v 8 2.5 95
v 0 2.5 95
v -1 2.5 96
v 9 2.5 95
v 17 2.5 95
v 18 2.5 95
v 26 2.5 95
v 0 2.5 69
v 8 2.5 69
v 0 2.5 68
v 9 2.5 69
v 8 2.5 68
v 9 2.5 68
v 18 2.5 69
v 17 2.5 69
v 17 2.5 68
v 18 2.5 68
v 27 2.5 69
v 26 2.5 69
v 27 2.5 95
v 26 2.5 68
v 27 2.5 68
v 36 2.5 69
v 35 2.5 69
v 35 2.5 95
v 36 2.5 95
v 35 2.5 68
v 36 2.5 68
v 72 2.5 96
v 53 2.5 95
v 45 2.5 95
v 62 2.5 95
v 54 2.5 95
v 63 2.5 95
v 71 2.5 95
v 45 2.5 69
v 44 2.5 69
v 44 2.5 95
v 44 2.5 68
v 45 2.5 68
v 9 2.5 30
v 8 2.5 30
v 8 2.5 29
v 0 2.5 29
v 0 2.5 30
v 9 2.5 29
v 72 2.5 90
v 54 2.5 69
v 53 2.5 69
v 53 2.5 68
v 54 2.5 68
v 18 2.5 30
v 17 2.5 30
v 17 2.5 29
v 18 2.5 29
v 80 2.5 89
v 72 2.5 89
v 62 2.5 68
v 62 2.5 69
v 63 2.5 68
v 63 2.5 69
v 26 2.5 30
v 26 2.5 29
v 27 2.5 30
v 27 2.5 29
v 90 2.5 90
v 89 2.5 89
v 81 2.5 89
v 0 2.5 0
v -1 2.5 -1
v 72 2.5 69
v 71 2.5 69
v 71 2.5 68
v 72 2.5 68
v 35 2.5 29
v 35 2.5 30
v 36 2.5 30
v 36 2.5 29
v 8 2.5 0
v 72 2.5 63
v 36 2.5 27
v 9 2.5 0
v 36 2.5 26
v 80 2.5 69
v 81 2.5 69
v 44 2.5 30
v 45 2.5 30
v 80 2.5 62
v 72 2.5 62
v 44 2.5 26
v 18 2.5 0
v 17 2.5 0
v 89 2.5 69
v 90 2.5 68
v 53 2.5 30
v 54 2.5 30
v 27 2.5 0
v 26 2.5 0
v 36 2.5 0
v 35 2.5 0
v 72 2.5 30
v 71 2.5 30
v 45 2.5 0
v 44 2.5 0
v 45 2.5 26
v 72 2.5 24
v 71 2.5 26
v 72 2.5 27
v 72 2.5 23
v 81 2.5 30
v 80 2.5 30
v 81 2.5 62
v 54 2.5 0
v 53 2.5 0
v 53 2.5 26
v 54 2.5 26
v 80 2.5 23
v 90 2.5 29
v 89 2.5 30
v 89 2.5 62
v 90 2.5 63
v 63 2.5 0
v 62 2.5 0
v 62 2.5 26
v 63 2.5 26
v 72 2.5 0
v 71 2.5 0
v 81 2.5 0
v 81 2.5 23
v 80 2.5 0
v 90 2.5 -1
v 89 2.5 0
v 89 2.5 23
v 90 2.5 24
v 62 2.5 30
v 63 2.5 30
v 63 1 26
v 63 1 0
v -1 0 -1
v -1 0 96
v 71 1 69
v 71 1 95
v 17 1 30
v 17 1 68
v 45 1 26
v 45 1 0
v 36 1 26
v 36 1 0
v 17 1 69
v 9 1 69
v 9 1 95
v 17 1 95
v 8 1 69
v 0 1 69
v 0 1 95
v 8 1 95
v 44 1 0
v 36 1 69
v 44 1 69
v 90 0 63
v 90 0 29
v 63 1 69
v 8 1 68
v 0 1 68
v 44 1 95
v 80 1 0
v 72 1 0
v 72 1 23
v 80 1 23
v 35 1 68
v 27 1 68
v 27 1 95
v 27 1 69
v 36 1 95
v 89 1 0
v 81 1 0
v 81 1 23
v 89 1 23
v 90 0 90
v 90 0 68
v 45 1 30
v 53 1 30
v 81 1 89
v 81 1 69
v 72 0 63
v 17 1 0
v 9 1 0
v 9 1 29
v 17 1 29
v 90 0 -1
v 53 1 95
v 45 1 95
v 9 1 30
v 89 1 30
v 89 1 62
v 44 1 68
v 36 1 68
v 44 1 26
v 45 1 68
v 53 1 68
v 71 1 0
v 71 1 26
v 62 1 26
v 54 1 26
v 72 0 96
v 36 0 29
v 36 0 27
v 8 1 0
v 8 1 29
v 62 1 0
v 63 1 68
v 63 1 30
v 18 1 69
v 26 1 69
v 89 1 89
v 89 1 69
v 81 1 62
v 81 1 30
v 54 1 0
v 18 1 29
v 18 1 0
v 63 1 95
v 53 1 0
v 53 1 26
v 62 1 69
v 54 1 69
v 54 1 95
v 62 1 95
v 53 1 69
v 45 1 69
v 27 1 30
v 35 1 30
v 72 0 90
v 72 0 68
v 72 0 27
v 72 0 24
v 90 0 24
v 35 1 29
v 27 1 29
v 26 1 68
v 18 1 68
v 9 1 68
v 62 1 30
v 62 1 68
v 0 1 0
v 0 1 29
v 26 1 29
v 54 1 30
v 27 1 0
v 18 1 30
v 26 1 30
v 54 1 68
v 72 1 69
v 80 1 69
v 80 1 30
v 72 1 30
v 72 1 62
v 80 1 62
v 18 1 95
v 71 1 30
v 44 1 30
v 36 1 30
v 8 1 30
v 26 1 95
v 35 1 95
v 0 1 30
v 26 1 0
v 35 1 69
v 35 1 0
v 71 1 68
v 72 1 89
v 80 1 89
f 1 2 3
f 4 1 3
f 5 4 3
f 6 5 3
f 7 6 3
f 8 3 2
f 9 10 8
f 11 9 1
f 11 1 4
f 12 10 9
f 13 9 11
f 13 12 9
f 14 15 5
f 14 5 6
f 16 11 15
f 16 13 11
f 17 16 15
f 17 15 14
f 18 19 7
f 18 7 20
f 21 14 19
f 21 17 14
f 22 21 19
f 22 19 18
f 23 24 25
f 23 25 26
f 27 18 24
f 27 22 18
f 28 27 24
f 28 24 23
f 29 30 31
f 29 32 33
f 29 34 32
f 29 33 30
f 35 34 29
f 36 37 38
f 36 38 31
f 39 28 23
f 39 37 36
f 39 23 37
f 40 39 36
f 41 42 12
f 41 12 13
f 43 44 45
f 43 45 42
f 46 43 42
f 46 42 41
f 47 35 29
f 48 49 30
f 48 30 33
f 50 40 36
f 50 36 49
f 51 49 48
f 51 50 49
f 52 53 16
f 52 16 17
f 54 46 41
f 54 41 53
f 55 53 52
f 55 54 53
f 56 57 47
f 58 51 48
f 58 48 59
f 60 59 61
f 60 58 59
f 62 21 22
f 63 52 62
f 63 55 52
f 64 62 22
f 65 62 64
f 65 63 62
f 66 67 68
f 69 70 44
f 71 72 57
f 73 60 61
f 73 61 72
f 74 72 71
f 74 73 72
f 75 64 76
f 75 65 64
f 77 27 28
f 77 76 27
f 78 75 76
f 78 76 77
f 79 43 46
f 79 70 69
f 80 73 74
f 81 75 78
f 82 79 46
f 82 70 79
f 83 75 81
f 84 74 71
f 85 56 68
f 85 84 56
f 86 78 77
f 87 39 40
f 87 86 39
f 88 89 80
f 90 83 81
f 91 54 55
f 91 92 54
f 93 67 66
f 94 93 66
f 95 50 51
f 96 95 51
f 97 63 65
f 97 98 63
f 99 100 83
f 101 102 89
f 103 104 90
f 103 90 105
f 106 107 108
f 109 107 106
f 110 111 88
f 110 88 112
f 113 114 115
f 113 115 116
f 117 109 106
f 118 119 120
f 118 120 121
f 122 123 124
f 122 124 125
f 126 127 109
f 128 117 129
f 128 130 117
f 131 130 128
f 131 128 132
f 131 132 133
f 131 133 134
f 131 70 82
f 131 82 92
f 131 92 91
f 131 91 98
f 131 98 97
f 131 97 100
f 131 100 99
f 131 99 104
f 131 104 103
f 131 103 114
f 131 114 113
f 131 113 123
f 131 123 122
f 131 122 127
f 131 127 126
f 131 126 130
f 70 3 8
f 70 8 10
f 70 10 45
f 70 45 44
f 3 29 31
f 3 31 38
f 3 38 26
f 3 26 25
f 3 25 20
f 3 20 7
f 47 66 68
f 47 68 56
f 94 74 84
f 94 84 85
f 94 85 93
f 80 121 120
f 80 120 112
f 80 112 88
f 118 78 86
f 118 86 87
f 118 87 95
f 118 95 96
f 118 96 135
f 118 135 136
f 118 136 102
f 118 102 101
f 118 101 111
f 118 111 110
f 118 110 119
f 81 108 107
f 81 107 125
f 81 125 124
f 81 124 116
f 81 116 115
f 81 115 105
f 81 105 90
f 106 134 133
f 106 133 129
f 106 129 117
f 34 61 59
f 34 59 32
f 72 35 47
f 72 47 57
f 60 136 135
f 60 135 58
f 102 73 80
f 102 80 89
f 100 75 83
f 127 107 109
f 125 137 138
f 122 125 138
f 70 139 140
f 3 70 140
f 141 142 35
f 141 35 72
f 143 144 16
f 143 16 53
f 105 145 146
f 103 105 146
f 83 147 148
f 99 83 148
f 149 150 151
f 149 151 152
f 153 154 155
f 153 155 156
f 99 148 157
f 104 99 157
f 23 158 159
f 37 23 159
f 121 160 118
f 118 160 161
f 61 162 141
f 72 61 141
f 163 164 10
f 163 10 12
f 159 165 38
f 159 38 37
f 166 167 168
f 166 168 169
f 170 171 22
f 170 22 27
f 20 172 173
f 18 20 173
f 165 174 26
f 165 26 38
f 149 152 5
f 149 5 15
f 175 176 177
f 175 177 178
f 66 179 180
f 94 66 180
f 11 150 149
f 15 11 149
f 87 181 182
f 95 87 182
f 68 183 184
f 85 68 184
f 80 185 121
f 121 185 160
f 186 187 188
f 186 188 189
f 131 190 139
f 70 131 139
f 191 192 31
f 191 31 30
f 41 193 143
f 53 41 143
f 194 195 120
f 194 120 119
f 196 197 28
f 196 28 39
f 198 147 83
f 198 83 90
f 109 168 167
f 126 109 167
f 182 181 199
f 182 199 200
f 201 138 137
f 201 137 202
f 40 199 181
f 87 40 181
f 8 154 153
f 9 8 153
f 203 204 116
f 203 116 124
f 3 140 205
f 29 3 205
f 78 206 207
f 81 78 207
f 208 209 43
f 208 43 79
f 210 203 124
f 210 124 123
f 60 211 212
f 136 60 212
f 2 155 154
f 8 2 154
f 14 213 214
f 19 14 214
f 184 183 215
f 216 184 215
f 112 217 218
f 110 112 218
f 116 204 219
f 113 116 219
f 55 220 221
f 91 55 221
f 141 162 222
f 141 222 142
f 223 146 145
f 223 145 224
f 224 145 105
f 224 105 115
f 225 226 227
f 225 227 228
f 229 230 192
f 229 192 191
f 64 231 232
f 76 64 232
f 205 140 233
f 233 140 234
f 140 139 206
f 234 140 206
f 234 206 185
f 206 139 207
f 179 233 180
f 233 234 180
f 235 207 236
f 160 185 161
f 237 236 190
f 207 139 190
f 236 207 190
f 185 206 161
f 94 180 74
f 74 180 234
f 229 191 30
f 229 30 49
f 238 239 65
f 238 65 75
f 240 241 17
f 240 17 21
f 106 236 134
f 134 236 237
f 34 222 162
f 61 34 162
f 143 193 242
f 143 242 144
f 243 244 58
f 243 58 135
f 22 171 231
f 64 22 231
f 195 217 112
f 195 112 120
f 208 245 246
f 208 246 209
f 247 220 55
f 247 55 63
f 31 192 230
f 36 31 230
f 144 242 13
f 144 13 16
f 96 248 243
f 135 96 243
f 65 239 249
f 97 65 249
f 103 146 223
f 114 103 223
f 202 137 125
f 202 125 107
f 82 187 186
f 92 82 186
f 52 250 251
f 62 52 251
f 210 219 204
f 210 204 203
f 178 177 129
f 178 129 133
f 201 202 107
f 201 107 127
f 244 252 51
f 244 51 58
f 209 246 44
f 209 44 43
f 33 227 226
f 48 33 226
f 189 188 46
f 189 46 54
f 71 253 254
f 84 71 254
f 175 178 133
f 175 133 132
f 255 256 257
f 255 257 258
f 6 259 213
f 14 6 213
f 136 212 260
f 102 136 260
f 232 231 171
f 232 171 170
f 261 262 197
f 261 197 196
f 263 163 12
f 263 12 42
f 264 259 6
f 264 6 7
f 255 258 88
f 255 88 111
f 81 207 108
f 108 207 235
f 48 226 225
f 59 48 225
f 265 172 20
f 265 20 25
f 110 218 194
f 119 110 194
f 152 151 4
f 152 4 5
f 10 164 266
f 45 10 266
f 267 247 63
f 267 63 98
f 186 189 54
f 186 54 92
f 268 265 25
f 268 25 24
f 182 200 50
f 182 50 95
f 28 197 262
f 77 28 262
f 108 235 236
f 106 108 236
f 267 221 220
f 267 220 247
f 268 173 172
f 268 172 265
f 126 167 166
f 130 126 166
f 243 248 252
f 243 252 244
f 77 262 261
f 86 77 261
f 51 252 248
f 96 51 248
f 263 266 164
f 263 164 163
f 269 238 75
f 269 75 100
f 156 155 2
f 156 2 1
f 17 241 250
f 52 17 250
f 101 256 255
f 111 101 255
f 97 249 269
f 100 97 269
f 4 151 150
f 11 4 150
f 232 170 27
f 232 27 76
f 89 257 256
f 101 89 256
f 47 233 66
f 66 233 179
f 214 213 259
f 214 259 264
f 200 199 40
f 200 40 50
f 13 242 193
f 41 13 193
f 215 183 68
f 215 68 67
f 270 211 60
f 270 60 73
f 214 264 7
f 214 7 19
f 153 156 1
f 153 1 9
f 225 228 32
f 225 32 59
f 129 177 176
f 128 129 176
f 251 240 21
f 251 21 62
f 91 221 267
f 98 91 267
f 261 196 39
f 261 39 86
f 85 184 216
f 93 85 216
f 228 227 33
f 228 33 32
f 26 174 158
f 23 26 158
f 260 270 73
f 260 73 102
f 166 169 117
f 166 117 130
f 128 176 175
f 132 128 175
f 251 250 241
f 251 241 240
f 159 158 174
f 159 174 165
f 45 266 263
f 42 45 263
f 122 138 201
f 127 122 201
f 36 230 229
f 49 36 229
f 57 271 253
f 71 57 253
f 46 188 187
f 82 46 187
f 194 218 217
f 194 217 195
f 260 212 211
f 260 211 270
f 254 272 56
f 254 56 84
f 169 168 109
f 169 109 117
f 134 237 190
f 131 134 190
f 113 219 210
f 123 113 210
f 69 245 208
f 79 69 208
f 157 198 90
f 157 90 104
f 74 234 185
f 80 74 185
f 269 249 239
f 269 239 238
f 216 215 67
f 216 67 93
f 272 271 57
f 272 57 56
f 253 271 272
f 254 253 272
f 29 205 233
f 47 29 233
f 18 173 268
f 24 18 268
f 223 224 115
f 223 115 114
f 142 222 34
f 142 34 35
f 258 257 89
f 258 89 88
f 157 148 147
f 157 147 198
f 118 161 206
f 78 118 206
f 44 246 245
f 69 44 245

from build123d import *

# Parameters (mm, degrees)
EXTRUDE_2_DEPTH     = 2.5
CUT_EXTRUDE_START   = 1
SKETCH_2_W          = 8
SKETCH_2_H          = 29
SKETCH_2_H_2        = 26
SKETCH_2_H_3        = 38
SKETCH_2_H_4        = 23
SKETCH_2_H_5        = 32
SKETCH_2_H_6        = 20
CUT_EXTRUDE_2_DEPTH = 1.5


with BuildPart() as part:
    # 草图3 → 凸台-拉伸2 (new body)
    with BuildSketch(Plane(origin=(0, 0, 0), x_dir=(1, 0, 0), z_dir=(0, 1, 0))):
        Polygon((90, 1), (-1, 1), (-1, -96), (72, -96), (72, -90), (90, -90), (90, -68), (72, -68), (72, -63), (90, -63), (90, -29), (72, -29), (36, -29), (36, -27), (72, -27), (72, -24), (90, -24), align=None)
    extrude(amount=EXTRUDE_2_DEPTH)

    # 草图2 → 切除-拉伸2 (cut)
    with BuildSketch(Plane(origin=(0, 0, 0), x_dir=(1, 0, 0), z_dir=(0, 1, 0)).offset(CUT_EXTRUDE_START)):
        with Locations((4, -14.5)):
            Rectangle(SKETCH_2_W, SKETCH_2_H)
        with Locations((13, -14.5)):
            Rectangle(SKETCH_2_W, SKETCH_2_H)
        with Locations((22, -14.5)):
            Rectangle(SKETCH_2_W, SKETCH_2_H)
        with Locations((31, -14.5)):
            Rectangle(SKETCH_2_W, SKETCH_2_H)
        with Locations((40, -13)):
            Rectangle(SKETCH_2_W, SKETCH_2_H_2)
        with Locations((4, -49)):
            Rectangle(SKETCH_2_W, SKETCH_2_H_3)
        with Locations((4, -82)):
            Rectangle(SKETCH_2_W, SKETCH_2_H_2)
        with Locations((49, -13)):
            Rectangle(SKETCH_2_W, SKETCH_2_H_2)
        with Locations((58, -13)):
            Rectangle(SKETCH_2_W, SKETCH_2_H_2)
        with Locations((67, -13)):
            Rectangle(SKETCH_2_W, SKETCH_2_H_2)
        with Locations((76, -11.5)):
            Rectangle(SKETCH_2_W, SKETCH_2_H_4)
        with Locations((85, -11.5)):
            Rectangle(SKETCH_2_W, SKETCH_2_H_4)
        with Locations((13, -49)):
            Rectangle(SKETCH_2_W, SKETCH_2_H_3)
        with Locations((22, -49)):
            Rectangle(SKETCH_2_W, SKETCH_2_H_3)
        with Locations((31, -49)):
            Rectangle(SKETCH_2_W, SKETCH_2_H_3)
        with Locations((40, -49)):
            Rectangle(SKETCH_2_W, SKETCH_2_H_3)
        with Locations((49, -49)):
            Rectangle(SKETCH_2_W, SKETCH_2_H_3)
        with Locations((58, -49)):
            Rectangle(SKETCH_2_W, SKETCH_2_H_3)
        with Locations((67, -49)):
            Rectangle(SKETCH_2_W, SKETCH_2_H_3)
        with Locations((76, -46)):
            Rectangle(SKETCH_2_W, SKETCH_2_H_5)
        with Locations((85, -46)):
            Rectangle(SKETCH_2_W, SKETCH_2_H_5)
        with Locations((13, -82)):
            Rectangle(SKETCH_2_W, SKETCH_2_H_2)
        with Locations((22, -82)):
            Rectangle(SKETCH_2_W, SKETCH_2_H_2)
        with Locations((31, -82)):
            Rectangle(SKETCH_2_W, SKETCH_2_H_2)
        with Locations((40, -82)):
            Rectangle(SKETCH_2_W, SKETCH_2_H_2)
        with Locations((49, -82)):
            Rectangle(SKETCH_2_W, SKETCH_2_H_2)
        with Locations((58, -82)):
            Rectangle(SKETCH_2_W, SKETCH_2_H_2)
        with Locations((67, -82)):
            Rectangle(SKETCH_2_W, SKETCH_2_H_2)
        with Locations((76, -79)):
            Rectangle(SKETCH_2_W, SKETCH_2_H_6)
        with Locations((85, -79)):
            Rectangle(SKETCH_2_W, SKETCH_2_H_6)
    extrude(amount=CUT_EXTRUDE_2_DEPTH, mode=Mode.SUBTRACT)


solid = part.part
